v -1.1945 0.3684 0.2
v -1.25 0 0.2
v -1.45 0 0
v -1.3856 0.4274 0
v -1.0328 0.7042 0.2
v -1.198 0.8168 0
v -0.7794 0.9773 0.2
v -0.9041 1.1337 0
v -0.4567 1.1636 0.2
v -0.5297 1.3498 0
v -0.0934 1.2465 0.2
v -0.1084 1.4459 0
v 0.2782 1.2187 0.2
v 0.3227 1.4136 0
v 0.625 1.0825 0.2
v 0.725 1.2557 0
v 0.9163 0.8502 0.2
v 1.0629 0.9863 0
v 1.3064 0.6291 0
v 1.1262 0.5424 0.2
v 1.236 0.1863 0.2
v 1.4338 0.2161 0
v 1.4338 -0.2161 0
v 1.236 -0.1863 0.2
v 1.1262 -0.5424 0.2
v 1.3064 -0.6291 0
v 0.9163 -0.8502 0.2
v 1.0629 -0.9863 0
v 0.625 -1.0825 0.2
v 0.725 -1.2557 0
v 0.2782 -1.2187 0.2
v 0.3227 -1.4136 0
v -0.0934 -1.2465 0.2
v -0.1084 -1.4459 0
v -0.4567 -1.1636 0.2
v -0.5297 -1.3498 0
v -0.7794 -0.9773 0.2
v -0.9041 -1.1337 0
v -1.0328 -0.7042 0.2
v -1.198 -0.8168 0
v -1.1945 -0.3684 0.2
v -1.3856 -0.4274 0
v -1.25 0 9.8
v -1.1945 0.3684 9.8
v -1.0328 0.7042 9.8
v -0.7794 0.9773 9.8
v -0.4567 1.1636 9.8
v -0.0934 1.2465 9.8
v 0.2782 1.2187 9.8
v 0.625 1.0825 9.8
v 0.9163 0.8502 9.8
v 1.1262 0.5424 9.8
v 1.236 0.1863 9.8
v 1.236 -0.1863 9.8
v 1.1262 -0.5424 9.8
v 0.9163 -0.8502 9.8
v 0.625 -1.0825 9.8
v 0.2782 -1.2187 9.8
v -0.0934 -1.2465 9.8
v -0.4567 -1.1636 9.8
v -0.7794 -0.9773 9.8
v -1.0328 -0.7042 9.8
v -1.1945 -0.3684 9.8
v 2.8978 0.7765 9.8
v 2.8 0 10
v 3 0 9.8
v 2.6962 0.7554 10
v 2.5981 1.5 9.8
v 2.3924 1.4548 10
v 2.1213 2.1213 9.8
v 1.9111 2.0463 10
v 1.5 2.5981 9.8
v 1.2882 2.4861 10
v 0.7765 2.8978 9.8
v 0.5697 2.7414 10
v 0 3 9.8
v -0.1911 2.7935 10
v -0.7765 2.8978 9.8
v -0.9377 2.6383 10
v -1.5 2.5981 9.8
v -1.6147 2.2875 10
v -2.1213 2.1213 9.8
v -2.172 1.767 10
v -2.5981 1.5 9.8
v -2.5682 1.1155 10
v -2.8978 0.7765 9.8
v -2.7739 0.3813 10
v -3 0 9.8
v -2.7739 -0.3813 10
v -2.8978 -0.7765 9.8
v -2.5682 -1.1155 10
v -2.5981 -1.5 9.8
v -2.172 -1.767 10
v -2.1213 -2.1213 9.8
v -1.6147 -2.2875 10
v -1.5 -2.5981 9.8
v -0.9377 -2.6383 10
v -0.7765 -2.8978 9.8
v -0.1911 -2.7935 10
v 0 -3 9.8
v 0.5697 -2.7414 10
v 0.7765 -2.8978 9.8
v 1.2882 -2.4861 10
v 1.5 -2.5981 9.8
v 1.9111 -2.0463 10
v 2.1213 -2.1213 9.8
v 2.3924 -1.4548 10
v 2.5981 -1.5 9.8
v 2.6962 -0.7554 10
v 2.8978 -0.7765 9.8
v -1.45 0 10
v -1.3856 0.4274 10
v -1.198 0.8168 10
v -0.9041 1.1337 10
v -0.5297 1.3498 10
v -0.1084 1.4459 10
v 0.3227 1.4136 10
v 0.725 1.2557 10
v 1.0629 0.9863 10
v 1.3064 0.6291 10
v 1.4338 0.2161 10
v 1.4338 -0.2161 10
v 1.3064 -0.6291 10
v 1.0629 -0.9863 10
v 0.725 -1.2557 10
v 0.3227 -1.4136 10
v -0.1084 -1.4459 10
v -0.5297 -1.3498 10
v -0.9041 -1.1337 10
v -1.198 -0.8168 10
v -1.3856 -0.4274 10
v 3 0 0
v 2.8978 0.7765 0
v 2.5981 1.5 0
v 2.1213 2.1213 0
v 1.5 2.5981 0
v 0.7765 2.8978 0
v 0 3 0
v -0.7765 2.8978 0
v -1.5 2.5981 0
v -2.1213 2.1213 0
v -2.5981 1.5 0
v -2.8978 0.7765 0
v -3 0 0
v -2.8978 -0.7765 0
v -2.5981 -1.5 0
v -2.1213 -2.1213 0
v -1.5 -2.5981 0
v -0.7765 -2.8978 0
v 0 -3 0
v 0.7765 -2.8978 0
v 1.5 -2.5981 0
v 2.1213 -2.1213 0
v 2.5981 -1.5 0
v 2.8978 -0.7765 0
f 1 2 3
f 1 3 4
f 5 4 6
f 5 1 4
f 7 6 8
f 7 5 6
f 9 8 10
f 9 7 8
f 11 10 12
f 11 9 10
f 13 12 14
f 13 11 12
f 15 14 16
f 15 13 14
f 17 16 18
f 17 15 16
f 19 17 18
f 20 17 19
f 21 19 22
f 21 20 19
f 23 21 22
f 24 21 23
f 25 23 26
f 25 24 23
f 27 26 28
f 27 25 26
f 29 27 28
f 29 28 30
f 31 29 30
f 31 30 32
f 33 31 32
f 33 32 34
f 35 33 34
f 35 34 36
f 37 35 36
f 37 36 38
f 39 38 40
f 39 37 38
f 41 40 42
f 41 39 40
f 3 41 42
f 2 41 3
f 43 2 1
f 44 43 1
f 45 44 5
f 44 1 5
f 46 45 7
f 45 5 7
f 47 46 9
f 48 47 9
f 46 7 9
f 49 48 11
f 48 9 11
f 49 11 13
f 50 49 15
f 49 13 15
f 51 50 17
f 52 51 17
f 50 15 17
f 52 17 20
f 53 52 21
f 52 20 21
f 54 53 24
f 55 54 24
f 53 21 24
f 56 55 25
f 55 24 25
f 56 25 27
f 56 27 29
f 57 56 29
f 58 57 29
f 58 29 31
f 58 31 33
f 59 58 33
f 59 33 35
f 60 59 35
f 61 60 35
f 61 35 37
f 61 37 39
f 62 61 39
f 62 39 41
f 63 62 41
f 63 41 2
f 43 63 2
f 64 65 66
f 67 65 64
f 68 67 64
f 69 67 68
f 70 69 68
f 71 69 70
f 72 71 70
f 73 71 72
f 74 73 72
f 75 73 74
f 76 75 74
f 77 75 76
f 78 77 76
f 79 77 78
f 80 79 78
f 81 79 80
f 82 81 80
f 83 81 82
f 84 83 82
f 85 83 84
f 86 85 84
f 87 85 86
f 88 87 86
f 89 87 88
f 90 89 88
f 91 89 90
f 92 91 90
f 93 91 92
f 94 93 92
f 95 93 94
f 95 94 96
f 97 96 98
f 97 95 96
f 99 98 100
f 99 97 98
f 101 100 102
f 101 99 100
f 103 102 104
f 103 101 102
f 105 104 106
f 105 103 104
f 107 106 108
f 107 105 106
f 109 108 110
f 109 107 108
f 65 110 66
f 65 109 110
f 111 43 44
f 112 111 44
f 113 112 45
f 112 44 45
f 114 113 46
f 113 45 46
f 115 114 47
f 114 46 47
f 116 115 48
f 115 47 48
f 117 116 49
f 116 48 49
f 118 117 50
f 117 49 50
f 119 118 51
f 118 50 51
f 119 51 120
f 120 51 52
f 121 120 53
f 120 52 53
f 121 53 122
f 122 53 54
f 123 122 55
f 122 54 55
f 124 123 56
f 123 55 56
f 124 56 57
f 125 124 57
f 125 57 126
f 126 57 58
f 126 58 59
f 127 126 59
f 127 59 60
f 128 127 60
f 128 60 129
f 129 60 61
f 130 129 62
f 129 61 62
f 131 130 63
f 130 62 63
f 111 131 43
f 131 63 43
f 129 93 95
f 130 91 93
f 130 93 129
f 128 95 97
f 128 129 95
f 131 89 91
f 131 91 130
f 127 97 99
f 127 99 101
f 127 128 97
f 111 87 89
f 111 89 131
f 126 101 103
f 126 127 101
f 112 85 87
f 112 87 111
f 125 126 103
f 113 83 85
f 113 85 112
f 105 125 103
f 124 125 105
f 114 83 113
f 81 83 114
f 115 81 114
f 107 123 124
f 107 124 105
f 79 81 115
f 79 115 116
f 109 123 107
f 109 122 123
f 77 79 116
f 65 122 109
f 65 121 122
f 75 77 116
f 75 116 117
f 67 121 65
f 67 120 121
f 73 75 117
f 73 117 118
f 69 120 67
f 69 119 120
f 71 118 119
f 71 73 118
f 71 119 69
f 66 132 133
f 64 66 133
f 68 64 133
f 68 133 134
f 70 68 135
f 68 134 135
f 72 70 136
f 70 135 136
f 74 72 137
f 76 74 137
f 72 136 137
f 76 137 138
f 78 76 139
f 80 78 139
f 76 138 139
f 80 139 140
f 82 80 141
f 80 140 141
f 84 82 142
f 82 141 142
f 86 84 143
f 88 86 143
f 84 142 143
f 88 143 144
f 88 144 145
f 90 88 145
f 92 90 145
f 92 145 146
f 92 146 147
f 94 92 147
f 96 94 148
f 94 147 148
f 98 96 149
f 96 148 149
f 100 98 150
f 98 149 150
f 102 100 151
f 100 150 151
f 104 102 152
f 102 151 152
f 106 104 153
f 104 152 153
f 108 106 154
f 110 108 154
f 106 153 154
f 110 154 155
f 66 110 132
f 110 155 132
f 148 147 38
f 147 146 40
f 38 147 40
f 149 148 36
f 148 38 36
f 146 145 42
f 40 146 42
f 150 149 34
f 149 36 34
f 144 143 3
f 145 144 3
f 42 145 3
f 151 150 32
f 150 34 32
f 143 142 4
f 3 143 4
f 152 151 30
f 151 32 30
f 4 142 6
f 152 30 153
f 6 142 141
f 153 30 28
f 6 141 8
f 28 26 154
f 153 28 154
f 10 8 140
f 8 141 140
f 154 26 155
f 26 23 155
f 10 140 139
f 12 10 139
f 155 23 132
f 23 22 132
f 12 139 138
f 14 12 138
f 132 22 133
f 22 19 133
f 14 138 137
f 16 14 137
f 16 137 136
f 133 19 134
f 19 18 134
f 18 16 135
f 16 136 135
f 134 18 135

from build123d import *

# Parameters (mm, degrees)
SKETCH_1_R         = 3
EXTRUDE_1_DEPTH    = 10
HOLE_WIZARD_M3_1_D = 2.5
CHAMFER_1_SIZE     = 0.2


with BuildPart() as part:
    # 草图1 → 凸台-拉伸1 (new body)
    with BuildSketch(Plane.XY):
        Circle(SKETCH_1_R)
    extrude(amount=EXTRUDE_1_DEPTH)

    # M3 螺纹孔1 (through all)
    with Locations(Plane.XY.offset(10)):
        with Locations((0, 0)):
            Hole(HOLE_WIZARD_M3_1_D / 2)

    # 倒角1
    chamfer_1_edges = [part.edges().sort_by_distance(p)[0] for p in [
        (-3, 0, 10),
        (1.25, 0, 10),
        (1.25, 0, 0),
    ]]
    chamfer(chamfer_1_edges, length=CHAMFER_1_SIZE)


solid = part.part
